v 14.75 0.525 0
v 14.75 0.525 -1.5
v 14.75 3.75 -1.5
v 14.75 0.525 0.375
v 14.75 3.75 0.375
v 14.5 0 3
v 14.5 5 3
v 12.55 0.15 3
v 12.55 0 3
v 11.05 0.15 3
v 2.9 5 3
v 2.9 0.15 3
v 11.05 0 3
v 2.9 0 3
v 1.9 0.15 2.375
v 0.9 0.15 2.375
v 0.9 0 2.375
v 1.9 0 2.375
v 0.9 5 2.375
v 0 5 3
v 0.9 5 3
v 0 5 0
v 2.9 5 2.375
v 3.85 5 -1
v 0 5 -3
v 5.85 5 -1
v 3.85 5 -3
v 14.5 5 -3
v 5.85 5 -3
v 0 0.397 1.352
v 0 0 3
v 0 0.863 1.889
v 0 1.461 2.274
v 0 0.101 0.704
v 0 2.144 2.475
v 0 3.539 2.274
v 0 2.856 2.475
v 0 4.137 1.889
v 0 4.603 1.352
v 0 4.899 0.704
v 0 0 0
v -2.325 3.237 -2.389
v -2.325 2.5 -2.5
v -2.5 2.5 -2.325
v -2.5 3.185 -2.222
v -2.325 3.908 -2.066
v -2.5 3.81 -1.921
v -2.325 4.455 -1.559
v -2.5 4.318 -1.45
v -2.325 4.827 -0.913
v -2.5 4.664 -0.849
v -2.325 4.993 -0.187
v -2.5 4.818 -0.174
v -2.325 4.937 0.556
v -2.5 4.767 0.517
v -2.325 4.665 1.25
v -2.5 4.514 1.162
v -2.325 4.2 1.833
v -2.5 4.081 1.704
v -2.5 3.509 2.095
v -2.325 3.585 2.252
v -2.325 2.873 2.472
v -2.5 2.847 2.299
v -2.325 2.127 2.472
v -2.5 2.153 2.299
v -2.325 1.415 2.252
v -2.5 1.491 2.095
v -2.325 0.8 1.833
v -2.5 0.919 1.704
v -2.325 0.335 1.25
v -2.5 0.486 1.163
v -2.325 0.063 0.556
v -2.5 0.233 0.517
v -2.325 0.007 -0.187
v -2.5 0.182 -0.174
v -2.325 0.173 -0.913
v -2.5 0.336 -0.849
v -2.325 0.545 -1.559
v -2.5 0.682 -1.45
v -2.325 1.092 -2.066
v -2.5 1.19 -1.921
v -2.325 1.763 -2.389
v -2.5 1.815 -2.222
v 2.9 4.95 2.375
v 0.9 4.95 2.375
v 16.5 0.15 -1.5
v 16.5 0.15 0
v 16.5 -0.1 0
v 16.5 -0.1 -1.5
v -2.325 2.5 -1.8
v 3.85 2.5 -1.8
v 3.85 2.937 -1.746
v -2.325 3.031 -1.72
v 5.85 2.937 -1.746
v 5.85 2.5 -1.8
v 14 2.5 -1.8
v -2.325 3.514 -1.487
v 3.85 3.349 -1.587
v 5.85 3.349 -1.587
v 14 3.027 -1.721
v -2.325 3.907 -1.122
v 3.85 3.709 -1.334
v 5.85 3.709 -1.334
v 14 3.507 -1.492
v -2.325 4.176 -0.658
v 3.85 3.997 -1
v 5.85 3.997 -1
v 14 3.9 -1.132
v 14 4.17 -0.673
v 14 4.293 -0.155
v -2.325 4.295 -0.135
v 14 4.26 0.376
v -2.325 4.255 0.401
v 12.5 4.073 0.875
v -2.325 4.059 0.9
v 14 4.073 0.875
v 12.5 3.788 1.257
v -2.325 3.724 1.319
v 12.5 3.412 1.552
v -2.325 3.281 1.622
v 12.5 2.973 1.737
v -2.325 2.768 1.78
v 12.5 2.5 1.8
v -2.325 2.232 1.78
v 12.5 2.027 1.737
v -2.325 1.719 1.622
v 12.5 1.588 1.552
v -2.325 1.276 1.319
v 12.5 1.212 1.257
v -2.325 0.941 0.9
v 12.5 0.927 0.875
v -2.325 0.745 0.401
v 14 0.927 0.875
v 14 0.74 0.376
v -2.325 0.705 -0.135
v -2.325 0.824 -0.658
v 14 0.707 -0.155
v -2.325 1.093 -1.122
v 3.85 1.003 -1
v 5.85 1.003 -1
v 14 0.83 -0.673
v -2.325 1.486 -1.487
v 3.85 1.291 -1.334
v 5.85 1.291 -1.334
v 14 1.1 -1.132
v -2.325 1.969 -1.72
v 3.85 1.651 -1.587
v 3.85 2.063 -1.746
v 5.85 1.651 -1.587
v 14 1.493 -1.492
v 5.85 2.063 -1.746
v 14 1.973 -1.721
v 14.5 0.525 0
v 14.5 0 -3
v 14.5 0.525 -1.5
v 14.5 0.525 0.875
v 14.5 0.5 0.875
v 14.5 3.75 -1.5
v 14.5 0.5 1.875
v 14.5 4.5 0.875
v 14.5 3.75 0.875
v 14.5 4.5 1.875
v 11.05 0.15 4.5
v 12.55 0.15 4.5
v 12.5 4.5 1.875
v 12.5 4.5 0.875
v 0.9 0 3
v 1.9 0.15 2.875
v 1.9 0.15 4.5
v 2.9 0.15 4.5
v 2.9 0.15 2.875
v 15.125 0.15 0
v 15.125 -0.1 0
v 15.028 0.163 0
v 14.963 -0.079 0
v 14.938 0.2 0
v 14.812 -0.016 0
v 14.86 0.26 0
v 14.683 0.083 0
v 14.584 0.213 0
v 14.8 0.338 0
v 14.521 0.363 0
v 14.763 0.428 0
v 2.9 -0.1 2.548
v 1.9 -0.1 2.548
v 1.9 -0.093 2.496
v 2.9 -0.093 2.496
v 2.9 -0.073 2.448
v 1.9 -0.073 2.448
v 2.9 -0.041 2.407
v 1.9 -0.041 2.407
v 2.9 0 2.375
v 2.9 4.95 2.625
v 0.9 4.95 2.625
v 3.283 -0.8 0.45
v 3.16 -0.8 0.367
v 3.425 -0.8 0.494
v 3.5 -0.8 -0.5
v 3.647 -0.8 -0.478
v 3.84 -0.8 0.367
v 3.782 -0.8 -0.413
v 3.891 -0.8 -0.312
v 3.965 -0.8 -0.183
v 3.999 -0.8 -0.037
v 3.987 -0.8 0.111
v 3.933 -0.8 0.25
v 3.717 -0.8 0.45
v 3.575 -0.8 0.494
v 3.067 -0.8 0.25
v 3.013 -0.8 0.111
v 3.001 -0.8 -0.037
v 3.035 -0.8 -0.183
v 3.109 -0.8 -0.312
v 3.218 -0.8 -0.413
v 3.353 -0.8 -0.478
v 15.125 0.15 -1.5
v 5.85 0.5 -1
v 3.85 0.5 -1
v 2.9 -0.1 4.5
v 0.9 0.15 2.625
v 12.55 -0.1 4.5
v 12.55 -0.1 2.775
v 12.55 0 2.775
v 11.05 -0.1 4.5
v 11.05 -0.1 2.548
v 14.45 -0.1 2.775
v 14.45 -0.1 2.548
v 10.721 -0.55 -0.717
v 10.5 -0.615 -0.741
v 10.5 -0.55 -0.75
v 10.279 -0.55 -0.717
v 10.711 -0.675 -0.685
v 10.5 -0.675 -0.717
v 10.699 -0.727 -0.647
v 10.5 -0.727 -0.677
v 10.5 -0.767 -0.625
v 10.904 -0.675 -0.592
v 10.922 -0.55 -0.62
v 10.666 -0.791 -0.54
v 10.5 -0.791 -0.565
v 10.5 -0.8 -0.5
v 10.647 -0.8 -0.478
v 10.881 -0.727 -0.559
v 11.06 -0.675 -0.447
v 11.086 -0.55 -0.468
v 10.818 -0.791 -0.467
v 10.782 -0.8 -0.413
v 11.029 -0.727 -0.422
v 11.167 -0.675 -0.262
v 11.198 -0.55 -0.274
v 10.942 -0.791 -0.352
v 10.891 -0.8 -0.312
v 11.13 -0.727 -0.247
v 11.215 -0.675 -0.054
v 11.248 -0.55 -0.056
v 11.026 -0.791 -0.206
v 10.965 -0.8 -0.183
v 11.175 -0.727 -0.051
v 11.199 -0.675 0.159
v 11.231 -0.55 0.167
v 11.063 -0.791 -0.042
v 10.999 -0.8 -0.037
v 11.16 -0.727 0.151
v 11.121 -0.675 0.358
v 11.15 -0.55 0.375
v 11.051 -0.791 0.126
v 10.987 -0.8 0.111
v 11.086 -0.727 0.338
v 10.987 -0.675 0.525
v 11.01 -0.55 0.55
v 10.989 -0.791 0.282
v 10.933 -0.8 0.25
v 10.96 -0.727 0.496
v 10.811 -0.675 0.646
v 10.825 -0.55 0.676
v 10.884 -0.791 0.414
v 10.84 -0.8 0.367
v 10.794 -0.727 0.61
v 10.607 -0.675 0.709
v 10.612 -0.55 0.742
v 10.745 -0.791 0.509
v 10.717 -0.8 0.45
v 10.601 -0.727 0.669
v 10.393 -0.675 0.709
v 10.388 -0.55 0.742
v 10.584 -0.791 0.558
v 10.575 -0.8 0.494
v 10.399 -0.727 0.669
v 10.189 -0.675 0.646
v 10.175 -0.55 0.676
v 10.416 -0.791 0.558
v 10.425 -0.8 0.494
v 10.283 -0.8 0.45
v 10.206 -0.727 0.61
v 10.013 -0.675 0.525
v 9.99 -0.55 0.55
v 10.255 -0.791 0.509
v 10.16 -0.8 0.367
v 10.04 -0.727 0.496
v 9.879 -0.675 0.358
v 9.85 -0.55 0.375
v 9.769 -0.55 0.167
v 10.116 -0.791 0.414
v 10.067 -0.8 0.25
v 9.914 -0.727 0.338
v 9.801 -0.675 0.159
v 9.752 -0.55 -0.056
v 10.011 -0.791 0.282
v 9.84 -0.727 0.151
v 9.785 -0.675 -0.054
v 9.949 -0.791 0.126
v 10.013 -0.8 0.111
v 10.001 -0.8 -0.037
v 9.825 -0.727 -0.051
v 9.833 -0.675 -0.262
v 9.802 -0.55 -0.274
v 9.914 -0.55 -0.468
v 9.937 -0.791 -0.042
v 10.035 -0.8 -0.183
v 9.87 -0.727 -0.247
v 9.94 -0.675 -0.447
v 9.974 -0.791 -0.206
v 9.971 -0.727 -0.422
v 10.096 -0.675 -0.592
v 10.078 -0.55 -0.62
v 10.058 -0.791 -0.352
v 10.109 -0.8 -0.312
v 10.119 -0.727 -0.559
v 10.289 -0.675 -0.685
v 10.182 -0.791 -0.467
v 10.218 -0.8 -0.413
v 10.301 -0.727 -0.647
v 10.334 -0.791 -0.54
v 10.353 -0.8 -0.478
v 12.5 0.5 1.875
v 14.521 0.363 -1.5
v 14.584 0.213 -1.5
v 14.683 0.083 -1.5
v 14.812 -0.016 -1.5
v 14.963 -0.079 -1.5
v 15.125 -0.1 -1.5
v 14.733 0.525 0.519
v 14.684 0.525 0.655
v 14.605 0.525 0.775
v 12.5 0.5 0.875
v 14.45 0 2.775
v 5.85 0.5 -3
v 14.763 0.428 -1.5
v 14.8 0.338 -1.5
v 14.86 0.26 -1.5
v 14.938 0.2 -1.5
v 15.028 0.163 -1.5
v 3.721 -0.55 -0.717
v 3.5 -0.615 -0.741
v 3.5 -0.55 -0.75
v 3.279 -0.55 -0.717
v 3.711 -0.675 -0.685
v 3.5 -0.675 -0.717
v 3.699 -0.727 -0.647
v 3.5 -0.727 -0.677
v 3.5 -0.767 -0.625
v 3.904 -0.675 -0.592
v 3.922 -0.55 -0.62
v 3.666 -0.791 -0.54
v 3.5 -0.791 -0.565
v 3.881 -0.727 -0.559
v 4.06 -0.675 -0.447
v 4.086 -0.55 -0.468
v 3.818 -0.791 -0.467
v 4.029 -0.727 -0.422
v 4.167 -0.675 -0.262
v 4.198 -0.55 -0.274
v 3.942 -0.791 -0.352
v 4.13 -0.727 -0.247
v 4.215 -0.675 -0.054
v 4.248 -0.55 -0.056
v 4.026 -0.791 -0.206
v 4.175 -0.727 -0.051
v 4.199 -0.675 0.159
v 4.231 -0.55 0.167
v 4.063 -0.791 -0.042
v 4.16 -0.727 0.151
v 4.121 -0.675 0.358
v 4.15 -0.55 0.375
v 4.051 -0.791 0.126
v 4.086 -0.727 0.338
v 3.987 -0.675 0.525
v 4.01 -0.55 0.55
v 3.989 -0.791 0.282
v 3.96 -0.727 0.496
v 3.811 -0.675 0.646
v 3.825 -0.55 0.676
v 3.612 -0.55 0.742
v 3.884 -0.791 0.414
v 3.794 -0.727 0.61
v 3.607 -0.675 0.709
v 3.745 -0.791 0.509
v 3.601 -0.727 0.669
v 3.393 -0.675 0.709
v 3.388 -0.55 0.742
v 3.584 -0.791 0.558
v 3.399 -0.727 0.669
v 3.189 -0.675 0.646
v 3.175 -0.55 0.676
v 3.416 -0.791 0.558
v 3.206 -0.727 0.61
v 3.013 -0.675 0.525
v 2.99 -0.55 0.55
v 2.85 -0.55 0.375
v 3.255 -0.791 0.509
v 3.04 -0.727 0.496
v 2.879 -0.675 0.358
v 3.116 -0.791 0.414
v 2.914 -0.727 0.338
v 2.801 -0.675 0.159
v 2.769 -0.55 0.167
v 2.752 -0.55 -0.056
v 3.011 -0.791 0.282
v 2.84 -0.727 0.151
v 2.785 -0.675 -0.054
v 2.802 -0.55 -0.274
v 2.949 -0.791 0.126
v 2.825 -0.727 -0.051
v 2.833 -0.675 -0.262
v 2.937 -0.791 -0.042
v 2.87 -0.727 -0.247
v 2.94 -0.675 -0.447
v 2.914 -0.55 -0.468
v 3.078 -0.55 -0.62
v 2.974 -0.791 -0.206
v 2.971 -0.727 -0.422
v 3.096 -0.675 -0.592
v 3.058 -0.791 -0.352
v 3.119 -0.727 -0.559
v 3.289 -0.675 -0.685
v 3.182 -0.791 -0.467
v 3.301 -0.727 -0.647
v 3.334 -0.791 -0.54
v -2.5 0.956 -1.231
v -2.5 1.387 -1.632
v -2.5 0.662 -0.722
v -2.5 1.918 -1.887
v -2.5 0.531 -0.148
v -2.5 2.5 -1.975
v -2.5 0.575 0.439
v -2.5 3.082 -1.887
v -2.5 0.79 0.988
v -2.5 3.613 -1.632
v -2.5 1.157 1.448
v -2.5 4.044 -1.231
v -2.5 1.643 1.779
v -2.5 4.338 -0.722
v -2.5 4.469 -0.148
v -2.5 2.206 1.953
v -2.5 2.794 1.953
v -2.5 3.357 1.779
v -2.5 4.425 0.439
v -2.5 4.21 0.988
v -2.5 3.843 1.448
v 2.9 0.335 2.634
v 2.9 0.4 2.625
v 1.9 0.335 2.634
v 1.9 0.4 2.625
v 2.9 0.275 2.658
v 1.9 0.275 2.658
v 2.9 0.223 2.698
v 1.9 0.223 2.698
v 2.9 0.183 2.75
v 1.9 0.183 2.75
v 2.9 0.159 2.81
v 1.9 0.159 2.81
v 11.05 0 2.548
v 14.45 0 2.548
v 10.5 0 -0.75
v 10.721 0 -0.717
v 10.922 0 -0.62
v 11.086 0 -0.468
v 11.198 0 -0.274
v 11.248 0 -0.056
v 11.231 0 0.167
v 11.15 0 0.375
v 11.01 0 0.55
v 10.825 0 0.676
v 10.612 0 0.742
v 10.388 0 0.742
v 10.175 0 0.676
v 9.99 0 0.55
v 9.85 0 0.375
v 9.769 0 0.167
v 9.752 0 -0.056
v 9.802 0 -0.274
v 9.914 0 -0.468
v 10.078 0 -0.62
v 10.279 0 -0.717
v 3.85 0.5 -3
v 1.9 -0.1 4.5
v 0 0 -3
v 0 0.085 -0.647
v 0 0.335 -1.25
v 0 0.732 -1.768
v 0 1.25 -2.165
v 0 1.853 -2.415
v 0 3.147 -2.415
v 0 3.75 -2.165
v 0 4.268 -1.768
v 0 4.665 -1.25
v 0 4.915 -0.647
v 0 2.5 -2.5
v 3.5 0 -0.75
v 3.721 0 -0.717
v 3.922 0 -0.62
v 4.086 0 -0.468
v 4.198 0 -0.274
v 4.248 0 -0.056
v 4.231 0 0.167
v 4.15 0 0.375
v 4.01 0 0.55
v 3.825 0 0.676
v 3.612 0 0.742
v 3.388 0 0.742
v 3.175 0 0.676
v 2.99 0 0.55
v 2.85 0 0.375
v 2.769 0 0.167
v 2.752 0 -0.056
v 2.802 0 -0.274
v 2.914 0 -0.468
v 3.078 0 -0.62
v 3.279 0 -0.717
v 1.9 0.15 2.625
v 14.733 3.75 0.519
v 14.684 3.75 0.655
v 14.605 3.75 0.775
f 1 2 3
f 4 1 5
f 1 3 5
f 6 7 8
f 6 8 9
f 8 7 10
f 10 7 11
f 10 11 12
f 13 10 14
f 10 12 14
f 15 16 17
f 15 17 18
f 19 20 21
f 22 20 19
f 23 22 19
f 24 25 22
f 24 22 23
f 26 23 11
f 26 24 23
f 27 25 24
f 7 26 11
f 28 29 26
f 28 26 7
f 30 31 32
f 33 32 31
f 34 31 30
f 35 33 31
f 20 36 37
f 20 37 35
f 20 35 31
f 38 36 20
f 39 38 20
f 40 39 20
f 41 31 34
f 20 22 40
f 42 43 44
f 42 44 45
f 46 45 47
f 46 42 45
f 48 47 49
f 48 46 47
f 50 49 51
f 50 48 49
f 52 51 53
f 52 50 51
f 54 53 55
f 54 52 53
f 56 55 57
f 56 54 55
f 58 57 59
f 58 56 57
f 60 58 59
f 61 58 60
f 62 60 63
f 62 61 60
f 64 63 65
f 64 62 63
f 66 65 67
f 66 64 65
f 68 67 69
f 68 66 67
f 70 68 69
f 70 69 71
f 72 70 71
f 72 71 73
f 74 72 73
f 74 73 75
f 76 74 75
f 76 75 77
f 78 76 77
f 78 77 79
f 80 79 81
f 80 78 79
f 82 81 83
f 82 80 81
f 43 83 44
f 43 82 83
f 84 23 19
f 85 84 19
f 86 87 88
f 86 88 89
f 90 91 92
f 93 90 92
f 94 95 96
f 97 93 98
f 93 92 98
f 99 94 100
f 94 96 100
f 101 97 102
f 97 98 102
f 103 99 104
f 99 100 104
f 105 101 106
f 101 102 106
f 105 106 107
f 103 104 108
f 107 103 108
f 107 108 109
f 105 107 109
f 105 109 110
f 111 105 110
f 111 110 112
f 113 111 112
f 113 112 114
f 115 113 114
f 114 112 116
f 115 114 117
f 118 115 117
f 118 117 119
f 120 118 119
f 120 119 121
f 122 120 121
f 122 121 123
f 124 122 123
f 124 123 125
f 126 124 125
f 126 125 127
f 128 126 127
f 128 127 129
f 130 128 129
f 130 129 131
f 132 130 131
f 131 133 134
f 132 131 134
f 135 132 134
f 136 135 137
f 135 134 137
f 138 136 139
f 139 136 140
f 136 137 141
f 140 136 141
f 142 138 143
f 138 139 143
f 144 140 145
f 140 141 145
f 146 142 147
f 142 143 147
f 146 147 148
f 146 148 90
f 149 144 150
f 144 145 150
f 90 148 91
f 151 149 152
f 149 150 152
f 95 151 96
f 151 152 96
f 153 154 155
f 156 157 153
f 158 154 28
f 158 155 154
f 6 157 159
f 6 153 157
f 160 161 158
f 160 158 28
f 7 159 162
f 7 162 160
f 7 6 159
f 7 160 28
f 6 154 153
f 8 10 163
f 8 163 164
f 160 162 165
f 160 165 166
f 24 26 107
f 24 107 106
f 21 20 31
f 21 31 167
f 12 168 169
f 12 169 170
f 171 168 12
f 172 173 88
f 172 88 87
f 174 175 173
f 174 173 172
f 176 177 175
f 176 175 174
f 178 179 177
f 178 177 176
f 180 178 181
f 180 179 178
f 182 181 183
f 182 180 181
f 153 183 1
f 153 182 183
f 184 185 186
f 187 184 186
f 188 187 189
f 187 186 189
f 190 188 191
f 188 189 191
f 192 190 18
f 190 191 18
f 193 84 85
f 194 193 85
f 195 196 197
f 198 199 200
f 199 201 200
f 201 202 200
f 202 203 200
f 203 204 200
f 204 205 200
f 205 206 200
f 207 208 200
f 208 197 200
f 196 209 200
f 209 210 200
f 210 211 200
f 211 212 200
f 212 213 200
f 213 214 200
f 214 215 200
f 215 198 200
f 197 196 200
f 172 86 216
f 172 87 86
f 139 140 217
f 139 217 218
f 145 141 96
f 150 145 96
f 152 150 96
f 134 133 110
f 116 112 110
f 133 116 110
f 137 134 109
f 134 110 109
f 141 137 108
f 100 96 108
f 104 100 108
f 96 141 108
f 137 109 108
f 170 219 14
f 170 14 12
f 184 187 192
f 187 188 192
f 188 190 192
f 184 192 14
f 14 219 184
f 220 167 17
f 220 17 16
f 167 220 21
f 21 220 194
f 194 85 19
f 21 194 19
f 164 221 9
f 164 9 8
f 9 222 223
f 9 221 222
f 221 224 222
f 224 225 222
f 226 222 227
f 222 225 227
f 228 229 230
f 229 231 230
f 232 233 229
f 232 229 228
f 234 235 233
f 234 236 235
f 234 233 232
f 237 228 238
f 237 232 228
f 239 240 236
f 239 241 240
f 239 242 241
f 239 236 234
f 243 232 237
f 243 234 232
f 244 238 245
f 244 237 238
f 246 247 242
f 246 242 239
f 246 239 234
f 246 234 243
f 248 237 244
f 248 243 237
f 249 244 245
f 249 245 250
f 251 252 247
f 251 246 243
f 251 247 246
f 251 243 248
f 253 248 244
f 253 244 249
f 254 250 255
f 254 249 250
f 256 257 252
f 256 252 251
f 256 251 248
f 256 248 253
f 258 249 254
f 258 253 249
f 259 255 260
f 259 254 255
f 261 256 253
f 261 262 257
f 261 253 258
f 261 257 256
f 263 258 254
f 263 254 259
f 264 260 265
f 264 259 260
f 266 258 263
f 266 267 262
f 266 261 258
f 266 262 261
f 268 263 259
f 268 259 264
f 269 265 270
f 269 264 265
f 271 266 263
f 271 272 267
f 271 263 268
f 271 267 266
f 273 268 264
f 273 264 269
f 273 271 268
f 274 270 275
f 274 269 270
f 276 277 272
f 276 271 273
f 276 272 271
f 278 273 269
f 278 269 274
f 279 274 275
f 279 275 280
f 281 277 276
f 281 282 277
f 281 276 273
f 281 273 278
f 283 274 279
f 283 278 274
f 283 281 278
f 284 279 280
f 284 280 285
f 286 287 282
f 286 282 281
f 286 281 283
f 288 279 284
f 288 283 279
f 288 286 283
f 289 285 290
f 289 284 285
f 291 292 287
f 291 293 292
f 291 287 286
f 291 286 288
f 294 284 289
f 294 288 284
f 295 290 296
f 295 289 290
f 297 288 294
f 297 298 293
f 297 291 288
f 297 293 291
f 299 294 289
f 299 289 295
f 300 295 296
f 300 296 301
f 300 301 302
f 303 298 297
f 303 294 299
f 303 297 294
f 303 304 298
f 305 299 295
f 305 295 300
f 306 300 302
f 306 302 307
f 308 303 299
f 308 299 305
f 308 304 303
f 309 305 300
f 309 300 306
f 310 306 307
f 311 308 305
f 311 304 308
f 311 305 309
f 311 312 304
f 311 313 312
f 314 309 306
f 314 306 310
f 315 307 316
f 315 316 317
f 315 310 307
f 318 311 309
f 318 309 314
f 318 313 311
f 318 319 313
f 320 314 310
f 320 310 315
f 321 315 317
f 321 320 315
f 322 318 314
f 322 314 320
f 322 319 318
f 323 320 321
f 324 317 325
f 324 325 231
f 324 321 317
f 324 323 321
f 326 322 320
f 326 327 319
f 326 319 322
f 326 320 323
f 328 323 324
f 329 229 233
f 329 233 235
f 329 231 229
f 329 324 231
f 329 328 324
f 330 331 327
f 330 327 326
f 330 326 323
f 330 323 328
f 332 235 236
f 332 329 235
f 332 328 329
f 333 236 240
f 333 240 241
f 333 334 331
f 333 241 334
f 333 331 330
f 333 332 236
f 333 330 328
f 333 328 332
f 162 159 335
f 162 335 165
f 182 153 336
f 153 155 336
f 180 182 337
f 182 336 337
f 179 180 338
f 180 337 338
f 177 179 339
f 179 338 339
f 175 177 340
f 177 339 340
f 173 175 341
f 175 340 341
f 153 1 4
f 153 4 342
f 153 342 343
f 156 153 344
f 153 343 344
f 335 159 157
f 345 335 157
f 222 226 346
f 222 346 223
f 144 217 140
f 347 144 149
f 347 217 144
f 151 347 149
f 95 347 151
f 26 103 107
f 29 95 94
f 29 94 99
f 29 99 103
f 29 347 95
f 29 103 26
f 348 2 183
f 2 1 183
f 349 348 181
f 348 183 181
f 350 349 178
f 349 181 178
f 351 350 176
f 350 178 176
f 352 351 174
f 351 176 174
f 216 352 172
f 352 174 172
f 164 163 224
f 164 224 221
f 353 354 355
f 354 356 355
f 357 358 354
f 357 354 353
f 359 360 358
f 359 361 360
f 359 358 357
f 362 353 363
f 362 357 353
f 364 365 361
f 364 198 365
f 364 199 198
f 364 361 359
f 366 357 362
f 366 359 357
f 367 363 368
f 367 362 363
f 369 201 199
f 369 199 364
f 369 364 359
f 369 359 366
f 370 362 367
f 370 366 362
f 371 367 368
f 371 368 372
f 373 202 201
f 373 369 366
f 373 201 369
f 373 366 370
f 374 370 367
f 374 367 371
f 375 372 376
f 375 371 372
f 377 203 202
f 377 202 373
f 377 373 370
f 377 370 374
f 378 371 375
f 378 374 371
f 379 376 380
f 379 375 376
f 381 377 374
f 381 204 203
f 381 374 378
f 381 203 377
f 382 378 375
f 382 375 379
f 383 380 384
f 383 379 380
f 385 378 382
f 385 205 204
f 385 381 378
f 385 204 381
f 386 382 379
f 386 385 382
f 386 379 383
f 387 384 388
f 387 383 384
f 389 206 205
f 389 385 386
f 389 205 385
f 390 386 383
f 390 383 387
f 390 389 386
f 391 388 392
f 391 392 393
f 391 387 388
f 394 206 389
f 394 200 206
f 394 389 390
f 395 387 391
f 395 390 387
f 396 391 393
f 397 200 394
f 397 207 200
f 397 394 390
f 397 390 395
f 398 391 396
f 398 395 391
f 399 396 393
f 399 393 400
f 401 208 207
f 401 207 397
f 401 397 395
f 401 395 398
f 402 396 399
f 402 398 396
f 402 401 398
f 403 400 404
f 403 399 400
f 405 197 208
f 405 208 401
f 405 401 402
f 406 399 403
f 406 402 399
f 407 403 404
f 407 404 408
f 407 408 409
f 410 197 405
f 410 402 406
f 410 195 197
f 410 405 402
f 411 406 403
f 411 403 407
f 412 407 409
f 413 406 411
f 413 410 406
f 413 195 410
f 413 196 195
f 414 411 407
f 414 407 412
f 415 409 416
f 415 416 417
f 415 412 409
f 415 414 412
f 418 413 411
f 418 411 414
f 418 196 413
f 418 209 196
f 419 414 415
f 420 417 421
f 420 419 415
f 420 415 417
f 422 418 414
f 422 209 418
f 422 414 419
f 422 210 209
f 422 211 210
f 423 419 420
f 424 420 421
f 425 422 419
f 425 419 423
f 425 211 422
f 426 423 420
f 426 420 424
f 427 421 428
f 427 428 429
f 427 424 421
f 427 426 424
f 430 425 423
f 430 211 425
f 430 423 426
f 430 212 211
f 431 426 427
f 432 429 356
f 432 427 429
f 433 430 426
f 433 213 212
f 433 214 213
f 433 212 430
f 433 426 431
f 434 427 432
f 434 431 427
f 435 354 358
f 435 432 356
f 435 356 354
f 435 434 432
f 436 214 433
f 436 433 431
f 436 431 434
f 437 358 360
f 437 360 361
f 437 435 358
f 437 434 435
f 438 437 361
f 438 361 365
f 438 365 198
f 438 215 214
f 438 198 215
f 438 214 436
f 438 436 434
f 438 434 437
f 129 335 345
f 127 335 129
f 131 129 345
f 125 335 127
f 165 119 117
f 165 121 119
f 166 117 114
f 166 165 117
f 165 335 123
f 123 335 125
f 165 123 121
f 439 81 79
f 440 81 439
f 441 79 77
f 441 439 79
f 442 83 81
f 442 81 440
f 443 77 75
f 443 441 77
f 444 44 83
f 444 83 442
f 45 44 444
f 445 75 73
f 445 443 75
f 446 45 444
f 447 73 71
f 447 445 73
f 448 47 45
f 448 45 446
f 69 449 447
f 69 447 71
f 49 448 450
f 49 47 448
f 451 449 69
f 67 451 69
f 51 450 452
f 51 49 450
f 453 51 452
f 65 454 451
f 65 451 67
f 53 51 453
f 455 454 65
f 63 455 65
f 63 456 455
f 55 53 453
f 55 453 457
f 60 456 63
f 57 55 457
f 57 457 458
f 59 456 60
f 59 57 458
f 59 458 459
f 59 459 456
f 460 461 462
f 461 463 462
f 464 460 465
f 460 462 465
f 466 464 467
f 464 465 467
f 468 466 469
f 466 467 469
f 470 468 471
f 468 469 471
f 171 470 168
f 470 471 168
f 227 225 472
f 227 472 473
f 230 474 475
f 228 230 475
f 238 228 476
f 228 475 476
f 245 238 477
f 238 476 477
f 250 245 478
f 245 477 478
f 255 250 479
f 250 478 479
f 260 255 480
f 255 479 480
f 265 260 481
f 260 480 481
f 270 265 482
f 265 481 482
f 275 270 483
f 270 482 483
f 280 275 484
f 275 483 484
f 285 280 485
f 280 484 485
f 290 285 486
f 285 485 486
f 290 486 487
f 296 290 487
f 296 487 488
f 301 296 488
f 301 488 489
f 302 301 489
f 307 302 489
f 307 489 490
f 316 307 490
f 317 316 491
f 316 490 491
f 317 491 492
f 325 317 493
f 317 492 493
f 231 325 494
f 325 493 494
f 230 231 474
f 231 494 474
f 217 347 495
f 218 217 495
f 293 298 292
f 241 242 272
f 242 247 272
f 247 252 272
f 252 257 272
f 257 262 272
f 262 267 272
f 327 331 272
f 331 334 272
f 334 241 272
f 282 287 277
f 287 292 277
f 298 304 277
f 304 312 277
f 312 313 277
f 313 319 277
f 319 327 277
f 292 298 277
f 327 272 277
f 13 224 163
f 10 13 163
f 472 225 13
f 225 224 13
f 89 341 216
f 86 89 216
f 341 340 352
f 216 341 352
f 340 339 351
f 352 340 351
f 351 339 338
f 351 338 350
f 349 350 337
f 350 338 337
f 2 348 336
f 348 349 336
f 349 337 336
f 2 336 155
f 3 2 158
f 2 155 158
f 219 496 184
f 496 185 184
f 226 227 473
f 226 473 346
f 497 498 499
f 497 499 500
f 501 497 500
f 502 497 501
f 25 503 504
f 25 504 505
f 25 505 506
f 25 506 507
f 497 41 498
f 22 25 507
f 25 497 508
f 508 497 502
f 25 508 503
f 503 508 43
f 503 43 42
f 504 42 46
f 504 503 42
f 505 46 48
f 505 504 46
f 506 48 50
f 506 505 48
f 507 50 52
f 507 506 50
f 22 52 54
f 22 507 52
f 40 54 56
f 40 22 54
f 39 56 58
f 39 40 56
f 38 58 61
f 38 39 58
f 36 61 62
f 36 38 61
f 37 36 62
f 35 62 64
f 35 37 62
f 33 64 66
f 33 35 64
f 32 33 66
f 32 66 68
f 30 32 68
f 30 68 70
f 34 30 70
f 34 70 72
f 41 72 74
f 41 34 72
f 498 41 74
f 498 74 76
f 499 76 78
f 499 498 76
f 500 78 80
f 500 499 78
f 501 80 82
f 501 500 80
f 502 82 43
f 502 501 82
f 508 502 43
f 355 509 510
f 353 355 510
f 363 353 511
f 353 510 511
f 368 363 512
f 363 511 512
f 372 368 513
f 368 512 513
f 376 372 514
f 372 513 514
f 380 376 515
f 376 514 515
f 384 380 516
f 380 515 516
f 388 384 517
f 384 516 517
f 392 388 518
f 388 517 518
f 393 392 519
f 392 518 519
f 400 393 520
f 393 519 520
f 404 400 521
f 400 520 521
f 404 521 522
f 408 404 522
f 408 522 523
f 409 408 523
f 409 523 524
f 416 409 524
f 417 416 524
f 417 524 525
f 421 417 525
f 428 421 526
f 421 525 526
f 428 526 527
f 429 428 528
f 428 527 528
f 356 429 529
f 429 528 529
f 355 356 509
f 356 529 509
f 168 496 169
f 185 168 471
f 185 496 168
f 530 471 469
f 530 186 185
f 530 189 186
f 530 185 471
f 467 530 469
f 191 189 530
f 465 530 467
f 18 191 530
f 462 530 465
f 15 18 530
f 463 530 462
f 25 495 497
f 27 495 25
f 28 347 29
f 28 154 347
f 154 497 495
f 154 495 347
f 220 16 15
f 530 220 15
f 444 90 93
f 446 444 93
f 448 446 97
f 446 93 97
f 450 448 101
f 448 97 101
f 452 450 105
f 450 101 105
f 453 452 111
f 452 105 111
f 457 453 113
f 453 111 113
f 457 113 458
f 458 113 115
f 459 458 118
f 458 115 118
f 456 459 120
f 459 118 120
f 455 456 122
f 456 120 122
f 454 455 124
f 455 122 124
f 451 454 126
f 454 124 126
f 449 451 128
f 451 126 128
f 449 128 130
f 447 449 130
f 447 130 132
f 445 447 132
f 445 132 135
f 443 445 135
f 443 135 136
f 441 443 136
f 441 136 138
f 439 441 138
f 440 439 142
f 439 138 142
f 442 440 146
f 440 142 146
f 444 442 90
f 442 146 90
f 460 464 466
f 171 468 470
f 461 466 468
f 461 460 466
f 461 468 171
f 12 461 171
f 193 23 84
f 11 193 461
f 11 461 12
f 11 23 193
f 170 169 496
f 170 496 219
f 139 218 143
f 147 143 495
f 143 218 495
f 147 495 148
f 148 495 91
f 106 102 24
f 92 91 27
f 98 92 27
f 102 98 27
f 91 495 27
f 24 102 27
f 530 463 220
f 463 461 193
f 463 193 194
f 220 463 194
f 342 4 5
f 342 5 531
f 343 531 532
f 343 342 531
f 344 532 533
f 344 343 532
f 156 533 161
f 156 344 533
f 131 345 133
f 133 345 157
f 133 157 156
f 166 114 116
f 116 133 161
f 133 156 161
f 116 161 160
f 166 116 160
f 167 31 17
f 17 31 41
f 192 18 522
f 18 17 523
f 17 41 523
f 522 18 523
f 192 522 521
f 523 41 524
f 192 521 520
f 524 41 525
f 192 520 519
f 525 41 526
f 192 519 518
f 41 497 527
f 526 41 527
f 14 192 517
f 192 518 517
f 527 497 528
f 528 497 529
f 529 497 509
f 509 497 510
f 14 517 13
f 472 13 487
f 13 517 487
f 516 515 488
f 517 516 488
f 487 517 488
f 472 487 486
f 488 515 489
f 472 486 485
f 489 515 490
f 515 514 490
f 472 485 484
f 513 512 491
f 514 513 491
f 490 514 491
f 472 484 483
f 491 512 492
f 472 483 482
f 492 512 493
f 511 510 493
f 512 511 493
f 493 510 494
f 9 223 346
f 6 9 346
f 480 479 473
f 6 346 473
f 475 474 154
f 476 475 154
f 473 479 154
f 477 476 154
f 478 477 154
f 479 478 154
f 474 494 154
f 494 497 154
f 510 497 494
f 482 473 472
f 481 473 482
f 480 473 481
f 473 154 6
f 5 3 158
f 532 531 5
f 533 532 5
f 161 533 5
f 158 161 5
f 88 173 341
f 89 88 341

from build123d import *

# Parameters (mm, degrees)
SKETCH1_W            = 0.625
SKETCH1_H            = 1.5
REVOLVE1_ANGLE       = 90
BOSS_EXTRUDE1_DEPTH  = 4.475
SKETCH3_W            = 4.5
SKETCH3_H            = 4.475
BOSS_EXTRUDE2_DEPTH  = 12.6
SKETCH4_W            = 12.6
SKETCH4_H            = 4.5
BOSS_EXTRUDE3_DEPTH  = 0.525
SKETCH5_W            = 1.5
SKETCH5_H            = 5.1
BOSS_EXTRUDE4_DEPTH  = 1.375
SKETCH6_W            = 1.75
SKETCH6_H            = 1.5
CUT_EXTRUDE1_DEPTH   = 4.475
SKETCH7_W            = 1.75
SKETCH7_H            = 1.5
CUT_EXTRUDE2_DEPTH   = 0.375
CUT_EXTRUDE3_START   = -1.25
CUT_EXTRUDE3_DEPTH   = 1.25
SKETCH9_W            = 12.6
SKETCH9_H            = 5
BOSS_EXTRUDE5_DEPTH  = 1.5
BOSS_EXTRUDE6_START  = 1.9
BOSS_EXTRUDE6_DEPTH  = 1
SKETCH11_W           = 5.625
SKETCH11_H           = 5
BOSS_EXTRUDE7_DEPTH  = 1.9
SKETCH12_W           = 0.9
SKETCH12_H           = 5
BOSS_EXTRUDE8_DEPTH  = 0.375
CUT_EXTRUDE4_REACH   = 19.458
SKETCH14_W           = 1
SKETCH14_H           = 0.25
SKETCH15_W           = 1
SKETCH15_H           = 0.375
CUT_EXTRUDE5_DEPTH   = 4.85
SKETCH16_W           = 1
SKETCH16_H           = 0.25
BOSS_EXTRUDE9_DEPTH  = 1.5
BOSS_EXTRUDE10_REACH = 19.847
SKETCH18_W           = 1.5
SKETCH18_H           = 0.25
BOSS_EXTRUDE11_DEPTH = 1.5
SKETCH19_W           = 1
SKETCH19_H           = 4
CUT_EXTRUDE6_DEPTH   = 2
CUT_EXTRUDE7_REACH   = 20.059
SKETCH21_W           = 2
SKETCH21_H           = 0.05
SKETCH22_W           = 2
SKETCH22_H           = 4.5
CUT_EXTRUDE8_DEPTH   = 2
SKETCH23_W           = 2.5
SKETCH23_H           = 2.5
SKETCH24_W           = 0.75
SKETCH24_H           = 0.8
SKETCH25_W           = 0.75
SKETCH25_H           = 0.8
HOLE1_D              = 3.6
HOLE1_DEPTH          = 16.5
CHAMFER1_SIZE        = 0.175
FILLET1_R            = 0.25
FILLET2_R            = 0.375


# Read off the part's stored shape, not the designer's step: Boss-Extrude6
with BuildPart() as part:
    # Sketch1 → Revolve1 (revolve)
    with BuildSketch(Plane(origin=(0, 0.525, 0), x_dir=(1, 0, 0), z_dir=(0, 1, 0))):
        with Locations((14.8125, 0.75)):
            Rectangle(SKETCH1_W, SKETCH1_H)
    revolve(axis=Axis((15.125, 0.525, 0), (0, 0, 1)), revolution_arc=REVOLVE1_ANGLE)

    # Sketch2 → Boss-Extrude1 (add)
    with BuildSketch(Plane(origin=(0, 0.525, 0), x_dir=(-1, 0, 0), z_dir=(0, 1, 0))):
        with BuildLine():
            Line((-14.5, -1.5), (-15.125, -1.5))
            Line((-15.125, -1.5), (-15.125, 0))
            Line((-15.125, 0), (-14.75, 0))
            Line((-14.75, 0), (-14.75, 0.375))
            ThreePointArc((-14.75, 0.375), (-14.684016994, 0.654508497), (-14.5, 0.875))
            Line((-14.5, 0.875), (-14.5, -1.5))
        make_face()
    extrude(amount=BOSS_EXTRUDE1_DEPTH)

    # Sketch3 → Boss-Extrude2 (add)
    with BuildSketch(Plane.ZY.offset(-14.5)):
        with Locations((0.75, 2.7625)):
            Rectangle(SKETCH3_W, SKETCH3_H)
    extrude(amount=BOSS_EXTRUDE2_DEPTH)

    # Sketch4 → Boss-Extrude3 (add)
    with BuildSketch(Plane.XZ.offset(-0.525)):
        with Locations((8.2, 0.75)):
            Rectangle(SKETCH4_W, SKETCH4_H)
    extrude(amount=BOSS_EXTRUDE3_DEPTH)

    # Sketch5 → Boss-Extrude4 (add)
    with BuildSketch(Plane(origin=(15.125, 0, 0), x_dir=(0, 0, -1), z_dir=(1, 0, 0))):
        with Locations((0.75, 2.45)):
            Rectangle(SKETCH5_W, SKETCH5_H)
    extrude(amount=BOSS_EXTRUDE4_DEPTH)

    # Sketch6 → Cut-Extrude1 (cut)
    with BuildSketch(Plane(origin=(0, 5, 0), x_dir=(-1, 0, 0), z_dir=(0, 1, 0))):
        with Locations((-15.625, -0.75)):
            Rectangle(SKETCH6_W, SKETCH6_H)
    extrude(amount=-CUT_EXTRUDE1_DEPTH, mode=Mode.SUBTRACT)

    # Sketch7 → Cut-Extrude2 (cut)
    with BuildSketch(Plane(origin=(0, 0.525, 0), x_dir=(-1, 0, 0), z_dir=(0, 1, 0))):
        with Locations((-15.625, -0.75)):
            Rectangle(SKETCH7_W, SKETCH7_H)
    extrude(amount=-CUT_EXTRUDE2_DEPTH, mode=Mode.SUBTRACT)

    # Sketch8 → Cut-Extrude3 (cut)
    with BuildSketch(Plane(origin=(0, 5, 0), x_dir=(-1, 0, 0), z_dir=(0, 1, 0)).offset(CUT_EXTRUDE3_START)):
        with BuildLine():
            Line((-14.75, -1.5), (-14.5, -1.5))
            Line((-14.5, -1.5), (-14.5, 0.875))
            ThreePointArc((-14.5, 0.875), (-14.684016994, 0.654508497), (-14.75, 0.375))
            Line((-14.75, 0.375), (-14.75, -1.5))
        make_face()
    extrude(amount=CUT_EXTRUDE3_DEPTH, mode=Mode.SUBTRACT)

    # Sketch9 → Boss-Extrude5 (add)
    with BuildSketch(Plane(origin=(0, 0, -1.5), x_dir=(-1, 0, 0), z_dir=(0, 0, -1))):
        with Locations((-8.2, 2.5)):
            Rectangle(SKETCH9_W, SKETCH9_H)
    extrude(amount=BOSS_EXTRUDE5_DEPTH)

    # Boss-Extrude6 outline → Boss-Extrude6 (add)
    with BuildSketch(Plane.YZ.offset(BOSS_EXTRUDE6_START)):
        with BuildLine():
            Line((0, 3), (-0.1, 3))
            Line((-0.1, 3), (-0.1, 2.548205081))
            ThreePointArc((-0.1, 2.548205081), (-0.073205081, 2.448205081), (0, 2.375))
            Line((0, 2.375), (0, 3))
        make_face()
    extrude(amount=BOSS_EXTRUDE6_DEPTH)

    # Sketch11 → Boss-Extrude7 (add)
    with BuildSketch(Plane.ZY.offset(-1.9)):
        with Locations((-0.1875, 2.5)):
            Rectangle(SKETCH11_W, SKETCH11_H)
    extrude(amount=BOSS_EXTRUDE7_DEPTH)

    # Sketch12 → Boss-Extrude8 (add)
    with BuildSketch(Plane.XY.offset(2.625)):
        with Locations((0.45, 2.5)):
            Rectangle(SKETCH12_W, SKETCH12_H)
    extrude(amount=BOSS_EXTRUDE8_DEPTH)

    # Sketch14 → Cut-Extrude4 (cut, up to next)
    with BuildSketch(Plane(origin=(0, 0.15, 0), x_dir=(1, 0, 0), z_dir=(0, 1, 0)), mode=Mode.PRIVATE) as cut_extrude4_sk1:
        with Locations((1.4, -2.5)):
            Rectangle(SKETCH14_W, SKETCH14_H)
    cut_extrude4_tool1 = extrude(cut_extrude4_sk1.sketch, amount=-CUT_EXTRUDE4_REACH, mode=Mode.PRIVATE) & part.part
    add(cut_extrude4_tool1.solids().sort_by_distance((1.4, 0.15, 2.5))[0], mode=Mode.SUBTRACT)

    # Sketch15 → Cut-Extrude5 (cut)
    with BuildSketch(Plane(origin=(0, 5, 0), x_dir=(-1, 0, 0), z_dir=(0, 1, 0))):
        with Locations((-2.4, 2.8125)):
            Rectangle(SKETCH15_W, SKETCH15_H)
    extrude(amount=-CUT_EXTRUDE5_DEPTH, mode=Mode.SUBTRACT)

    # Sketch16 → Boss-Extrude9 (add)
    with BuildSketch(Plane.XY.offset(3)):
        with Locations((2.4, 0.025)):
            Rectangle(SKETCH16_W, SKETCH16_H)
    extrude(amount=BOSS_EXTRUDE9_DEPTH)

    # Sketch17 → Boss-Extrude10 (add, up to next)
    with BuildSketch(Plane.XZ.offset(0.1), mode=Mode.PRIVATE) as boss_extrude10_sk1:
        Polygon((12.55, 2.775), (12.55, 3), (11.05, 3), (11.05, 2.548205081), (14.45, 2.548205081), (14.45, 2.775), align=None)
    boss_extrude10_tool1 = extrude(boss_extrude10_sk1.sketch, amount=-BOSS_EXTRUDE10_REACH, mode=Mode.PRIVATE) - part.part
    add(boss_extrude10_tool1.solids().sort_by_distance((12.460785, -0.1, 2.730374))[0])

    # Sketch18 → Boss-Extrude11 (add)
    with BuildSketch(Plane.XY.offset(3)):
        with Locations((11.8, 0.025)):
            Rectangle(SKETCH18_W, SKETCH18_H)
    extrude(amount=BOSS_EXTRUDE11_DEPTH)

    # Sketch19 → Cut-Extrude6 (cut)
    with BuildSketch(Plane(origin=(14.5, 0, 0), x_dir=(0, 0, -1), z_dir=(1, 0, 0))):
        with Locations((-1.375, 2.5)):
            Rectangle(SKETCH19_W, SKETCH19_H)
    extrude(amount=-CUT_EXTRUDE6_DEPTH, mode=Mode.SUBTRACT)

    # Sketch21 → Cut-Extrude7 (cut, up to next)
    with BuildSketch(Plane(origin=(0, 0, 2.375), x_dir=(-1, 0, 0), z_dir=(0, 0, -1)), mode=Mode.PRIVATE) as cut_extrude7_sk1:
        with Locations((-1.9, 4.975)):
            Rectangle(SKETCH21_W, SKETCH21_H)
    cut_extrude7_tool1 = extrude(cut_extrude7_sk1.sketch, amount=-CUT_EXTRUDE7_REACH, mode=Mode.PRIVATE) & part.part
    add(cut_extrude7_tool1.solids().sort_by_distance((1.9, 4.975, 2.375))[0], mode=Mode.SUBTRACT)

    # Sketch22 → Cut-Extrude8 (cut)
    with BuildSketch(Plane(origin=(0, 0, -3), x_dir=(-1, 0, 0), z_dir=(0, 0, -1))):
        with Locations((-4.85, 2.75)):
            Rectangle(SKETCH22_W, SKETCH22_H)
    extrude(amount=-CUT_EXTRUDE8_DEPTH, mode=Mode.SUBTRACT)

    # Sketch23 → Revolve2 (revolve)
    with BuildSketch(Plane.XY, mode=Mode.PRIVATE) as revolve2_sk:
        with Locations((-1.25, 3.75)):
            Rectangle(SKETCH23_W, SKETCH23_H)
    revolve(revolve2_sk.sketch.rotate(Axis((-2.5, 2.5, 0), (1, 0, 0)), 270), axis=Axis((-2.5, 2.5, 0), (1, 0, 0)))

    # Sketch24 → Revolve3 (revolve)
    with BuildSketch(Plane.XY, mode=Mode.PRIVATE) as revolve3_sk:
        with Locations((3.875, -0.4)):
            Rectangle(SKETCH24_W, SKETCH24_H)
    revolve(revolve3_sk.sketch.rotate(Axis((3.5, 0, 0), (0, -1, 0)), 270), axis=Axis((3.5, 0, 0), (0, -1, 0)))

    # Sketch25 → Revolve4 (revolve)
    with BuildSketch(Plane.XY, mode=Mode.PRIVATE) as revolve4_sk:
        with Locations((10.875, -0.4)):
            Rectangle(SKETCH25_W, SKETCH25_H)
    revolve(revolve4_sk.sketch.rotate(Axis((10.5, 0, 0), (0, -1, 0)), 270), axis=Axis((10.5, 0, 0), (0, -1, 0)))

    # Hole1
    with Locations(Plane.ZY.offset(2.5)):
        with Locations((0, 2.5)):
            Hole(HOLE1_D / 2, depth=HOLE1_DEPTH)

    # Chamfer1
    chamfer1_edges = [part.edges().sort_by_distance(p)[0] for p in [
        (-2.5, 2.5, 2.5),
        (-2.5, 2.5, 1.8),
    ]]
    chamfer(chamfer1_edges, length=CHAMFER1_SIZE)

    # Fillet1
    fillet1_edges = [part.edges().sort_by_distance(p)[0] for p in [
        (2.4, 0.15, 2.625),
        (3.5, -0.8, 0.75),
        (10.5, -0.8, 0.75),
    ]]
    fillet(fillet1_edges, radius=FILLET1_R)

    # Fillet2
    fillet2_edges = [part.edges().sort_by_distance(p)[0] for p in [
        (14.75, 0.15, -0.75),
    ]]
    fillet(fillet2_edges, radius=FILLET2_R)


solid = part.part
